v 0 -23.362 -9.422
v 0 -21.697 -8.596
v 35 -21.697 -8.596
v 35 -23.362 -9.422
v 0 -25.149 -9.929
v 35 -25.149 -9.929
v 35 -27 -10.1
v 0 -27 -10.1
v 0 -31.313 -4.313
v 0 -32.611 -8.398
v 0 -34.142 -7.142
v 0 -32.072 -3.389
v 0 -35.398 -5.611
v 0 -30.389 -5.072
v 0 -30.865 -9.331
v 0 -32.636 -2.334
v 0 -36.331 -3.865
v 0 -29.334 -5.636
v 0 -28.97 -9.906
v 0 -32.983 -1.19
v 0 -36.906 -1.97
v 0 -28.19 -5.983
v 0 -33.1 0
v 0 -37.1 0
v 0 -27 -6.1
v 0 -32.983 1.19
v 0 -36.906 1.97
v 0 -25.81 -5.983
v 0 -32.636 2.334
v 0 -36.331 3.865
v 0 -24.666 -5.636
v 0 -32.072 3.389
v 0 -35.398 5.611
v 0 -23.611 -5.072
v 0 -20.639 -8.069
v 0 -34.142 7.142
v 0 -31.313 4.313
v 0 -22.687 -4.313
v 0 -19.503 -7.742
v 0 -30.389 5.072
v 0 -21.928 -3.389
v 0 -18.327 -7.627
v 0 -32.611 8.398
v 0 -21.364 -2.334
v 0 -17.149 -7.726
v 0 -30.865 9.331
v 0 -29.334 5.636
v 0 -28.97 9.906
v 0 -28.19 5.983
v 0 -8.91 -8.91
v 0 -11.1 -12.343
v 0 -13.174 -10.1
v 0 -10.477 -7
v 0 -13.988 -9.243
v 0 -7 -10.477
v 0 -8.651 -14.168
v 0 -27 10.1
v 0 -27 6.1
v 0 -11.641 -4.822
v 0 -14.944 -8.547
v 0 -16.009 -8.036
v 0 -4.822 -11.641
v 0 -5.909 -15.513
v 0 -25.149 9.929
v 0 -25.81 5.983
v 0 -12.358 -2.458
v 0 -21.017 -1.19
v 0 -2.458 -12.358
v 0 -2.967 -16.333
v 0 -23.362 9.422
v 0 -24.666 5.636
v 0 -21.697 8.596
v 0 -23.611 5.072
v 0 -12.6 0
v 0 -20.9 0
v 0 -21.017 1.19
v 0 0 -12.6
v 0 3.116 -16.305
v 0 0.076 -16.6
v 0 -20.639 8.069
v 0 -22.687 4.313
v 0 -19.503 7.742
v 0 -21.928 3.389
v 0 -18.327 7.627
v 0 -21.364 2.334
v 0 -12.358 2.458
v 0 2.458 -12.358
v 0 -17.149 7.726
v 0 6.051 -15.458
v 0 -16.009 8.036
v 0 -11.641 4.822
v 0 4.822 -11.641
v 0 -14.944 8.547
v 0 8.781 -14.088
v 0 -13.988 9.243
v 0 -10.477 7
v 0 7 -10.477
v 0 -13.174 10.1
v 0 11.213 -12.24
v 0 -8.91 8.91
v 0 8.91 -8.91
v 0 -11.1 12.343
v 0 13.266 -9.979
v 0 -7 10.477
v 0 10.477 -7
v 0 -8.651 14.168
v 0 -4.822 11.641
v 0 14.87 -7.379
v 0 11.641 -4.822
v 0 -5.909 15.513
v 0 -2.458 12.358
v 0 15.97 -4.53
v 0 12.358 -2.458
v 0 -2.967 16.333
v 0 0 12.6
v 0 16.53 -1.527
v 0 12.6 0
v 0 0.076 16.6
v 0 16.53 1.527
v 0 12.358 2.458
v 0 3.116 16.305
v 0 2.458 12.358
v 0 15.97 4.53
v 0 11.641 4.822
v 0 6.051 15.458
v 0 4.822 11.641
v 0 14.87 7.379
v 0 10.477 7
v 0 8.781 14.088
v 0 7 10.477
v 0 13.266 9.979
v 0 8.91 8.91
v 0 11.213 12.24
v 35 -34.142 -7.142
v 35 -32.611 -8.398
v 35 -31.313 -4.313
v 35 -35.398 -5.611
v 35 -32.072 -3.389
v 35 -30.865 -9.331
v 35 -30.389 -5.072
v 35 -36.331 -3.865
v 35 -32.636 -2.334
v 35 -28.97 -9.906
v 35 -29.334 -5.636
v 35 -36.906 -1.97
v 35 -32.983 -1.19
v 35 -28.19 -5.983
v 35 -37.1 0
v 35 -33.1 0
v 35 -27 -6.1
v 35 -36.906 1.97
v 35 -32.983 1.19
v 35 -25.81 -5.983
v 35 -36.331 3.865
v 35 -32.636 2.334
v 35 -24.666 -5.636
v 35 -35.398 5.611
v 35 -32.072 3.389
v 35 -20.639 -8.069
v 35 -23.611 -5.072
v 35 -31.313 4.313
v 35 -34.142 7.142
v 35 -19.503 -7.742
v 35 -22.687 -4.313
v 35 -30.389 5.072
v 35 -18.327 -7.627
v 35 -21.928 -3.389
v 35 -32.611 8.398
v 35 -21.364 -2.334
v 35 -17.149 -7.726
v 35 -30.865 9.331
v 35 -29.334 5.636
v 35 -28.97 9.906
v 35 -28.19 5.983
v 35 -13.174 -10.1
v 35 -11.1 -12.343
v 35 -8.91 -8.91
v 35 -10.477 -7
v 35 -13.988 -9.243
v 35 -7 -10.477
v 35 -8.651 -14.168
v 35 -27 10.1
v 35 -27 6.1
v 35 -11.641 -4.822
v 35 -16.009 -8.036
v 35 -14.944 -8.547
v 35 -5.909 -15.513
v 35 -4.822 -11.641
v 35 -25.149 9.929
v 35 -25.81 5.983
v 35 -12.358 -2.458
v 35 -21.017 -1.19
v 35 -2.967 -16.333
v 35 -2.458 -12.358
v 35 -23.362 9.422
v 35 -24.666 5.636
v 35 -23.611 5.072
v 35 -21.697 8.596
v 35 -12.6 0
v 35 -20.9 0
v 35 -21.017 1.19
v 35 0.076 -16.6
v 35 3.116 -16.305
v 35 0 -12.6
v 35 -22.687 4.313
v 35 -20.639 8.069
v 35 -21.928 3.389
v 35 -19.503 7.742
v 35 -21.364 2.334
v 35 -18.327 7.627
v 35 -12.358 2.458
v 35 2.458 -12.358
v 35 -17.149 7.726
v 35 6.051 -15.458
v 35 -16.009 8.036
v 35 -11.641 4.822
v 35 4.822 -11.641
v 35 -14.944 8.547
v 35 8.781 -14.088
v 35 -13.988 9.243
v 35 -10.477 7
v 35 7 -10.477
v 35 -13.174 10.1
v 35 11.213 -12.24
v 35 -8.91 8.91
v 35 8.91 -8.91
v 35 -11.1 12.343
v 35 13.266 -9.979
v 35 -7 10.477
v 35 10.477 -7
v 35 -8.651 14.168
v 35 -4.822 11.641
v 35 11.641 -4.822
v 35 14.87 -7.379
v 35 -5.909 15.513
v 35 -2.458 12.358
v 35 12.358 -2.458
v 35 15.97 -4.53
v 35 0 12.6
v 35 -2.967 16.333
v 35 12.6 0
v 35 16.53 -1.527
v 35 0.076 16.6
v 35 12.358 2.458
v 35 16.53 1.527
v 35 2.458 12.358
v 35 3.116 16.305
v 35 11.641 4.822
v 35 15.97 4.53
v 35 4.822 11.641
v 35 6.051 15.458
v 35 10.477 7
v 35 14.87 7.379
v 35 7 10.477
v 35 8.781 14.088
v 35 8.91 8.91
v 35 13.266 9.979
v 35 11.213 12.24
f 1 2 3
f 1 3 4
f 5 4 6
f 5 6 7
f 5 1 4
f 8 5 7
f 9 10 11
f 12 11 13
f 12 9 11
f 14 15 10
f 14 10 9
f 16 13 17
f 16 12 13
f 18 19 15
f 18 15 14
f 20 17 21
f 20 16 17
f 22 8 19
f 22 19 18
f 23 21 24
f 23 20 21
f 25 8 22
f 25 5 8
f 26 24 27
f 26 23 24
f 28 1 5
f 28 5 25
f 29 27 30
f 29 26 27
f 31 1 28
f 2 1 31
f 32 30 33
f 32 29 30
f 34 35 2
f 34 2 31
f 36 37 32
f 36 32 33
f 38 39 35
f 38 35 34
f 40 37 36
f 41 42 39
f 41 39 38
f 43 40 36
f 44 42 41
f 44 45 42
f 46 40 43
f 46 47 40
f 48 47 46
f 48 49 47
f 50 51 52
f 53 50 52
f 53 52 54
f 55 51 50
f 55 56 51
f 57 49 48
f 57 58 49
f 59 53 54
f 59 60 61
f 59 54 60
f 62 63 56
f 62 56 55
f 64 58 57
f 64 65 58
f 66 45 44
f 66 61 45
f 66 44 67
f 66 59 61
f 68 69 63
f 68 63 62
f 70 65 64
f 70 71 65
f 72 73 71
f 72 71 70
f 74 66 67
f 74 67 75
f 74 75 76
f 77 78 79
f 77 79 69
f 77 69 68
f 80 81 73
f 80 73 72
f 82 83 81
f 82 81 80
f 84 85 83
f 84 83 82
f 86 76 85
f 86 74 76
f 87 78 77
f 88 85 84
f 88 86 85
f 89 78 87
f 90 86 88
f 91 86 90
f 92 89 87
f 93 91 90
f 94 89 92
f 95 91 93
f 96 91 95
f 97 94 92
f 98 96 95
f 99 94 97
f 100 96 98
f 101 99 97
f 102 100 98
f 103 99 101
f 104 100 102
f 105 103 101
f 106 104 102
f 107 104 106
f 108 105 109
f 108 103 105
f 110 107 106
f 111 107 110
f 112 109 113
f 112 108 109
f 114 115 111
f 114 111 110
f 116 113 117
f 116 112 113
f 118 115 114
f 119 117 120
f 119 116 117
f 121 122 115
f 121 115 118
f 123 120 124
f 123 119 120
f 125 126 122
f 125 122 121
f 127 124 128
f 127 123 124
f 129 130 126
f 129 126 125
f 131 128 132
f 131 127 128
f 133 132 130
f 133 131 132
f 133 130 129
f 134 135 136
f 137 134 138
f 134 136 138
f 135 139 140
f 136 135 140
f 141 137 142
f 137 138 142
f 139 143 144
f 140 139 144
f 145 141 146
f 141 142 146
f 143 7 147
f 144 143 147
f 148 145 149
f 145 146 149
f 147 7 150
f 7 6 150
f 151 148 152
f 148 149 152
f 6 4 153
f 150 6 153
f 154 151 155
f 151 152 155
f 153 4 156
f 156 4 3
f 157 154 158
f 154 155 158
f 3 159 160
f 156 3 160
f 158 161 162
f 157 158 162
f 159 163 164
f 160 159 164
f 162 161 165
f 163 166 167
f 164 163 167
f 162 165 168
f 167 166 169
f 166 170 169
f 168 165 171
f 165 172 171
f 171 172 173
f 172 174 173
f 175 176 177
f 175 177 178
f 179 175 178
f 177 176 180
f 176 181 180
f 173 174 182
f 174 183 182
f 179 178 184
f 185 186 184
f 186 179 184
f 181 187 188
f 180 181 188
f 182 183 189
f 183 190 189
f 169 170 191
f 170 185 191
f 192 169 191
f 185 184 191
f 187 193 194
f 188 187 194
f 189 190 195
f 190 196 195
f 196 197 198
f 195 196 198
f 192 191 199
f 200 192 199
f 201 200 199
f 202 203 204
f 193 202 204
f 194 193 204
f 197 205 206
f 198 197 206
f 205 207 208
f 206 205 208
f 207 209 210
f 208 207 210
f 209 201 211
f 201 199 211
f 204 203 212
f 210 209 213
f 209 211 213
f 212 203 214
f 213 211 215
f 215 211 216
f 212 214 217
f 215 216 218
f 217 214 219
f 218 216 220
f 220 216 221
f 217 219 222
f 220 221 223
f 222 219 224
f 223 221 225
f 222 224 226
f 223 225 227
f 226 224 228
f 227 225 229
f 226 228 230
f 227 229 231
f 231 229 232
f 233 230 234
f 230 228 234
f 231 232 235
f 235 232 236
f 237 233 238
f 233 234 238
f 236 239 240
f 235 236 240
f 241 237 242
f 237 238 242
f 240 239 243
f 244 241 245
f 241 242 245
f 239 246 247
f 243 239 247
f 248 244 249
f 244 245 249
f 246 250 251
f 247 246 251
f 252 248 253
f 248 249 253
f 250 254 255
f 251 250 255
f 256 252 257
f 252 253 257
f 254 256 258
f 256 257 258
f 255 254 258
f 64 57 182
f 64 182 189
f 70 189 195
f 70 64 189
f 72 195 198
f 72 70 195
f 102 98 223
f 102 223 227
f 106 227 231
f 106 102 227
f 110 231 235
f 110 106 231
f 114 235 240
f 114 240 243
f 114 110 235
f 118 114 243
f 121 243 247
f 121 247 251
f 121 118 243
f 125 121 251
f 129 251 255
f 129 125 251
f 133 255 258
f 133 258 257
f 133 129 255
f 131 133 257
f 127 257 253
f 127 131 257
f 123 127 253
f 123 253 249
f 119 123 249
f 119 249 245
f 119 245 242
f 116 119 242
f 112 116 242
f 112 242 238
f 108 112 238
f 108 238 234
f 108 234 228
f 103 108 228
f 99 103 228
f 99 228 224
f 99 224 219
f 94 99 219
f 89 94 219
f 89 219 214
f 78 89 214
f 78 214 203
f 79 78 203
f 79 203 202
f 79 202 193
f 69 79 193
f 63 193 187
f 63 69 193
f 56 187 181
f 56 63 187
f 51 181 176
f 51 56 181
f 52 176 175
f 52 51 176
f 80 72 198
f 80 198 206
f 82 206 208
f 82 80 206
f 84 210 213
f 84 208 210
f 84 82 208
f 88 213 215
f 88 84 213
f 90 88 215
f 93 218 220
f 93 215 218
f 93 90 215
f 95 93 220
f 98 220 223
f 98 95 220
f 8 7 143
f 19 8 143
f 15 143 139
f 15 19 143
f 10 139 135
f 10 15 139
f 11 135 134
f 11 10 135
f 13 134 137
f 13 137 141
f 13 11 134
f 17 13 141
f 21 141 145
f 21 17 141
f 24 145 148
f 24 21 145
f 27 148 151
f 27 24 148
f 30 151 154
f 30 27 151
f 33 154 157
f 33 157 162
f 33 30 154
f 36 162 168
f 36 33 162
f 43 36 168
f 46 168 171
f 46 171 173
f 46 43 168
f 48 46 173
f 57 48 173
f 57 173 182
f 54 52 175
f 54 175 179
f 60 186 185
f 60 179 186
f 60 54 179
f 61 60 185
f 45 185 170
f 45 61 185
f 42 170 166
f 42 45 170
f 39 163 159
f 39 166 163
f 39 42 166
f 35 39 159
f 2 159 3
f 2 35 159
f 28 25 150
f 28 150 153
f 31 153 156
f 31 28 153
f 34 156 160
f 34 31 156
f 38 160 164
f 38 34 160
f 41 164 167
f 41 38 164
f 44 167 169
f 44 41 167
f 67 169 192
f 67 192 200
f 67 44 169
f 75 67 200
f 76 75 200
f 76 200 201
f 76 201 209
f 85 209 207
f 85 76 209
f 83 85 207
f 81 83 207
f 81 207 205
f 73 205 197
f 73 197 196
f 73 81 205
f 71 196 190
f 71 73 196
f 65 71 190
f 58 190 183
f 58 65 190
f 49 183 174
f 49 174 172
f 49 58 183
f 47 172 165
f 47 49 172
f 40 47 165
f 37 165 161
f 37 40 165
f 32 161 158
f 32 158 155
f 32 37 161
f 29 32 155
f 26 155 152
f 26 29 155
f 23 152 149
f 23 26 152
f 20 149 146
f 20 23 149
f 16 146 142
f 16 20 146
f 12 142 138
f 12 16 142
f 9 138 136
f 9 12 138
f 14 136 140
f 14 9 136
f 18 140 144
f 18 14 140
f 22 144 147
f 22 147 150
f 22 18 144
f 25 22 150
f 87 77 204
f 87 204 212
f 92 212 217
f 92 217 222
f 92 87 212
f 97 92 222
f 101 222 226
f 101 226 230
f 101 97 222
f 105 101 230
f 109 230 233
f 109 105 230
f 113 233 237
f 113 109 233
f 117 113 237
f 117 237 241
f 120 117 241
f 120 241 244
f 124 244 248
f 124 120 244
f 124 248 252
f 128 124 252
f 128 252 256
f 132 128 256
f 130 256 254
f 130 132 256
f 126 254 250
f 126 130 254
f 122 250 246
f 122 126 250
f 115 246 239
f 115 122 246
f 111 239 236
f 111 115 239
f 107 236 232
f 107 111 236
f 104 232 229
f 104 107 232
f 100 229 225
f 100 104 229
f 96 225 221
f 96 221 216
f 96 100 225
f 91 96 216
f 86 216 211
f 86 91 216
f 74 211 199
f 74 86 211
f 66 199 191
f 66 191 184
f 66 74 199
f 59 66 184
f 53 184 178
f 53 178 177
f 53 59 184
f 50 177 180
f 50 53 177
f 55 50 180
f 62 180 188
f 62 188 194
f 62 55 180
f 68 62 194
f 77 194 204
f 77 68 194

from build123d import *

# Parameters (mm, degrees)
SKETCH_1_R               = 12.6
SKETCH_1_R_2             = 6.1
EXTRUDE_1_DEPTH          = 35
CUT_EXTRUDE_1_DEPTH      = 54.637393673
CUT_EXTRUDE_1_DEPTH_BACK = 54.637393673


with BuildPart() as part:
    # 草图1 → 凸台-拉伸1 (new body)
    with BuildSketch(Plane(origin=(0, 0, 0), x_dir=(0, 0, -1), z_dir=(1, 0, 0))):
        with BuildLine():
            Line((-10.1, -27), (-10.1, -13.17383771))
            ThreePointArc((-10.1, -13.17383771), (0, 16.6), (10.1, -13.17383771))
            Line((10.1, -13.17383771), (10.1, -27))
            ThreePointArc((10.1, -27), (0, -37.1), (-10.1, -27))
        make_face()
        Circle(SKETCH_1_R, mode=Mode.SUBTRACT)
        with Locations((0, -27)):
            Circle(SKETCH_1_R_2, mode=Mode.SUBTRACT)
    extrude(amount=EXTRUDE_1_DEPTH)

    # 草图3 → 切除-拉伸1 (cut, two sides: drawn at the far end of the back side and taken through both)
    with BuildSketch(Plane(origin=(35, 0, 0), x_dir=(0, 0, -1), z_dir=(1, 0, 0)).offset(-CUT_EXTRUDE_1_DEPTH_BACK)):
        with BuildLine():
            Line((-16.628183068, -24.289618904), (-10.1, -27))
            ThreePointArc((-10.1, -27), (-9.71664565, -24.243771181), (-8.595683702, -21.696772521))
            ThreePointArc((-8.595683702, -21.696772521), (-16.131989791, -12.088249305), (-16.628183068, -24.289618904))
        make_face()
        with BuildLine():
            Line((10.1, -27), (14.395468751, -24.781680805))
            ThreePointArc((14.395468751, -24.781680805), (17.188775236, -12.535721906), (8.595683702, -21.696772521))
            ThreePointArc((8.595683702, -21.696772521), (9.71664565, -24.243771181), (10.1, -27))
        make_face()
    extrude(amount=CUT_EXTRUDE_1_DEPTH + CUT_EXTRUDE_1_DEPTH_BACK, mode=Mode.SUBTRACT)


solid = part.part
